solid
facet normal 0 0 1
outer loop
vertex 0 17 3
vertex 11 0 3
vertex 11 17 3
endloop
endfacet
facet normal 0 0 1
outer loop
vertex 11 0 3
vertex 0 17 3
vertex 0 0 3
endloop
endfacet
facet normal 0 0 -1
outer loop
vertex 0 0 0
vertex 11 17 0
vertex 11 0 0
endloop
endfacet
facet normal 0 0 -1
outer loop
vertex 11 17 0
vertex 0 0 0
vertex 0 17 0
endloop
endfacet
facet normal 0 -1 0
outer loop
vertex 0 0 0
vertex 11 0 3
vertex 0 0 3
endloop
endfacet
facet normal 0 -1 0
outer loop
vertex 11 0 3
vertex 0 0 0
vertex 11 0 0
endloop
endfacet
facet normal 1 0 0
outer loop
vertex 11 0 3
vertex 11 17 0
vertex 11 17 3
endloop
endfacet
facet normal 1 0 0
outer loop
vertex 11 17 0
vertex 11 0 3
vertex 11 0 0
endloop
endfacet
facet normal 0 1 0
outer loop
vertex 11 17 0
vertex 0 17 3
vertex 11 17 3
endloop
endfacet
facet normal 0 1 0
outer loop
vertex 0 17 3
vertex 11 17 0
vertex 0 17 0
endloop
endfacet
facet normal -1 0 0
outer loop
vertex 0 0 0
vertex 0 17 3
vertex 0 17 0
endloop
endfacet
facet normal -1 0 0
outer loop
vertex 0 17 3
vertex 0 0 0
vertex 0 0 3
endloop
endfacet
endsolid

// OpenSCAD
// Generated by SolidPython 1.0.1 on 2020-07-29 00:46:55


cube(size = [11, 17, 3]);
/***********************************************
*********      SolidPython code:      **********
************************************************
 
# import packages: SolidPython
from solid import *
from solid.utils import *
from itertools import chain, combinations, permutations


class Resize:

    def __init__(self, scad_file):
        self.scad_file = scad_file
        #self.scad_file = import_scad(scad_file)
        # cone/cylinder param:
        self.r1 = 0
        self.r2 = 0
        self.h = 0
        # rectangular prism param:
        self.w = 0
        self.l = 0
        # ellipse param:
        self.r = 0

    # import OpenScad code (file name corresponds to shape)


    # classify shape + parameters
    def assign(self, param1, param2, param3):
        if self.scad_file == 'cone.scad':
            self.r1 = param1
            self.r2 = param2
            self.h = param3
        elif self.scad_file == 'cylinder.scad':
            self.r1 = param1
            self.r2 = param2
            self.h = param3
        elif self.scad_file == 'rectangularPrism.scad':
            self.h = param1
            self.l = param2
            self.w = param3
        else:
            self.r = param1
            self.h = param2

    # resize parameters
    def iterate(self):
        x = range(3, 20, 2)
        i = 1
        if self.scad_file == 'cone.scad':
            tempList = list(permutations(x, 2))
            for temp in tempList:
                param1 = temp[0]
                param2 = temp[1]
                filepath = 'produced_scad_files/' + 'cone' + str(param1) + '_' + str(param2) + '_' + '.scad'
                scad_render_to_file(cylinder(h=param1, r1=param2, r2=0), filepath)

        elif self.scad_file == 'cylinder.scad':
            tempList = list(permutations(x, 3))
            for temp in tempList:
                param1 = temp[0]
                param2 = temp[1]
                filepath = 'produced_scad_files/' + 'cylinder' + str(param1) + '_' + str(param2) + '_' + '.scad'
                scad_render_to_file(cylinder(h=param1, r1=param2, r2=param2), filepath)

        elif self.scad_file == 'rectangularPrism.scad':
            tempList = list(permutations(x, 3))
            for temp in tempList:
                param1 = temp[0]
                param2 = temp[1]
                param3 = temp[2]
                filepath = 'produced_scad_files/' + 'rectangularPrism' + str(param1) + '_' + str(param2) + '_' + str(
                    param3) + '.scad'
                scad_render_to_file(cube(size=(param1, param2, param3)), filepath)

        elif self.scad_file == 'ellipse.scad':
            tempList = list(permutations(x, 4))
            for temp in tempList:
                param1 = temp[0]
                param2 = temp[1]
                param3 = temp[2]
                param4 = temp[3]
                filepath = 'produced_scad_files/' + 'ellipse' + str(param1) + '_' + str(param2) + '_' + str(param3) + '_' + str(param4) + '.scad'
                scad_render_to_file(scale([param1, param2, param3])(sphere(r=param4)), filepath)

    def render_to_scadfile(self):
        scad_render_to_file(scad, 'example.scad') 
 
************************************************/
